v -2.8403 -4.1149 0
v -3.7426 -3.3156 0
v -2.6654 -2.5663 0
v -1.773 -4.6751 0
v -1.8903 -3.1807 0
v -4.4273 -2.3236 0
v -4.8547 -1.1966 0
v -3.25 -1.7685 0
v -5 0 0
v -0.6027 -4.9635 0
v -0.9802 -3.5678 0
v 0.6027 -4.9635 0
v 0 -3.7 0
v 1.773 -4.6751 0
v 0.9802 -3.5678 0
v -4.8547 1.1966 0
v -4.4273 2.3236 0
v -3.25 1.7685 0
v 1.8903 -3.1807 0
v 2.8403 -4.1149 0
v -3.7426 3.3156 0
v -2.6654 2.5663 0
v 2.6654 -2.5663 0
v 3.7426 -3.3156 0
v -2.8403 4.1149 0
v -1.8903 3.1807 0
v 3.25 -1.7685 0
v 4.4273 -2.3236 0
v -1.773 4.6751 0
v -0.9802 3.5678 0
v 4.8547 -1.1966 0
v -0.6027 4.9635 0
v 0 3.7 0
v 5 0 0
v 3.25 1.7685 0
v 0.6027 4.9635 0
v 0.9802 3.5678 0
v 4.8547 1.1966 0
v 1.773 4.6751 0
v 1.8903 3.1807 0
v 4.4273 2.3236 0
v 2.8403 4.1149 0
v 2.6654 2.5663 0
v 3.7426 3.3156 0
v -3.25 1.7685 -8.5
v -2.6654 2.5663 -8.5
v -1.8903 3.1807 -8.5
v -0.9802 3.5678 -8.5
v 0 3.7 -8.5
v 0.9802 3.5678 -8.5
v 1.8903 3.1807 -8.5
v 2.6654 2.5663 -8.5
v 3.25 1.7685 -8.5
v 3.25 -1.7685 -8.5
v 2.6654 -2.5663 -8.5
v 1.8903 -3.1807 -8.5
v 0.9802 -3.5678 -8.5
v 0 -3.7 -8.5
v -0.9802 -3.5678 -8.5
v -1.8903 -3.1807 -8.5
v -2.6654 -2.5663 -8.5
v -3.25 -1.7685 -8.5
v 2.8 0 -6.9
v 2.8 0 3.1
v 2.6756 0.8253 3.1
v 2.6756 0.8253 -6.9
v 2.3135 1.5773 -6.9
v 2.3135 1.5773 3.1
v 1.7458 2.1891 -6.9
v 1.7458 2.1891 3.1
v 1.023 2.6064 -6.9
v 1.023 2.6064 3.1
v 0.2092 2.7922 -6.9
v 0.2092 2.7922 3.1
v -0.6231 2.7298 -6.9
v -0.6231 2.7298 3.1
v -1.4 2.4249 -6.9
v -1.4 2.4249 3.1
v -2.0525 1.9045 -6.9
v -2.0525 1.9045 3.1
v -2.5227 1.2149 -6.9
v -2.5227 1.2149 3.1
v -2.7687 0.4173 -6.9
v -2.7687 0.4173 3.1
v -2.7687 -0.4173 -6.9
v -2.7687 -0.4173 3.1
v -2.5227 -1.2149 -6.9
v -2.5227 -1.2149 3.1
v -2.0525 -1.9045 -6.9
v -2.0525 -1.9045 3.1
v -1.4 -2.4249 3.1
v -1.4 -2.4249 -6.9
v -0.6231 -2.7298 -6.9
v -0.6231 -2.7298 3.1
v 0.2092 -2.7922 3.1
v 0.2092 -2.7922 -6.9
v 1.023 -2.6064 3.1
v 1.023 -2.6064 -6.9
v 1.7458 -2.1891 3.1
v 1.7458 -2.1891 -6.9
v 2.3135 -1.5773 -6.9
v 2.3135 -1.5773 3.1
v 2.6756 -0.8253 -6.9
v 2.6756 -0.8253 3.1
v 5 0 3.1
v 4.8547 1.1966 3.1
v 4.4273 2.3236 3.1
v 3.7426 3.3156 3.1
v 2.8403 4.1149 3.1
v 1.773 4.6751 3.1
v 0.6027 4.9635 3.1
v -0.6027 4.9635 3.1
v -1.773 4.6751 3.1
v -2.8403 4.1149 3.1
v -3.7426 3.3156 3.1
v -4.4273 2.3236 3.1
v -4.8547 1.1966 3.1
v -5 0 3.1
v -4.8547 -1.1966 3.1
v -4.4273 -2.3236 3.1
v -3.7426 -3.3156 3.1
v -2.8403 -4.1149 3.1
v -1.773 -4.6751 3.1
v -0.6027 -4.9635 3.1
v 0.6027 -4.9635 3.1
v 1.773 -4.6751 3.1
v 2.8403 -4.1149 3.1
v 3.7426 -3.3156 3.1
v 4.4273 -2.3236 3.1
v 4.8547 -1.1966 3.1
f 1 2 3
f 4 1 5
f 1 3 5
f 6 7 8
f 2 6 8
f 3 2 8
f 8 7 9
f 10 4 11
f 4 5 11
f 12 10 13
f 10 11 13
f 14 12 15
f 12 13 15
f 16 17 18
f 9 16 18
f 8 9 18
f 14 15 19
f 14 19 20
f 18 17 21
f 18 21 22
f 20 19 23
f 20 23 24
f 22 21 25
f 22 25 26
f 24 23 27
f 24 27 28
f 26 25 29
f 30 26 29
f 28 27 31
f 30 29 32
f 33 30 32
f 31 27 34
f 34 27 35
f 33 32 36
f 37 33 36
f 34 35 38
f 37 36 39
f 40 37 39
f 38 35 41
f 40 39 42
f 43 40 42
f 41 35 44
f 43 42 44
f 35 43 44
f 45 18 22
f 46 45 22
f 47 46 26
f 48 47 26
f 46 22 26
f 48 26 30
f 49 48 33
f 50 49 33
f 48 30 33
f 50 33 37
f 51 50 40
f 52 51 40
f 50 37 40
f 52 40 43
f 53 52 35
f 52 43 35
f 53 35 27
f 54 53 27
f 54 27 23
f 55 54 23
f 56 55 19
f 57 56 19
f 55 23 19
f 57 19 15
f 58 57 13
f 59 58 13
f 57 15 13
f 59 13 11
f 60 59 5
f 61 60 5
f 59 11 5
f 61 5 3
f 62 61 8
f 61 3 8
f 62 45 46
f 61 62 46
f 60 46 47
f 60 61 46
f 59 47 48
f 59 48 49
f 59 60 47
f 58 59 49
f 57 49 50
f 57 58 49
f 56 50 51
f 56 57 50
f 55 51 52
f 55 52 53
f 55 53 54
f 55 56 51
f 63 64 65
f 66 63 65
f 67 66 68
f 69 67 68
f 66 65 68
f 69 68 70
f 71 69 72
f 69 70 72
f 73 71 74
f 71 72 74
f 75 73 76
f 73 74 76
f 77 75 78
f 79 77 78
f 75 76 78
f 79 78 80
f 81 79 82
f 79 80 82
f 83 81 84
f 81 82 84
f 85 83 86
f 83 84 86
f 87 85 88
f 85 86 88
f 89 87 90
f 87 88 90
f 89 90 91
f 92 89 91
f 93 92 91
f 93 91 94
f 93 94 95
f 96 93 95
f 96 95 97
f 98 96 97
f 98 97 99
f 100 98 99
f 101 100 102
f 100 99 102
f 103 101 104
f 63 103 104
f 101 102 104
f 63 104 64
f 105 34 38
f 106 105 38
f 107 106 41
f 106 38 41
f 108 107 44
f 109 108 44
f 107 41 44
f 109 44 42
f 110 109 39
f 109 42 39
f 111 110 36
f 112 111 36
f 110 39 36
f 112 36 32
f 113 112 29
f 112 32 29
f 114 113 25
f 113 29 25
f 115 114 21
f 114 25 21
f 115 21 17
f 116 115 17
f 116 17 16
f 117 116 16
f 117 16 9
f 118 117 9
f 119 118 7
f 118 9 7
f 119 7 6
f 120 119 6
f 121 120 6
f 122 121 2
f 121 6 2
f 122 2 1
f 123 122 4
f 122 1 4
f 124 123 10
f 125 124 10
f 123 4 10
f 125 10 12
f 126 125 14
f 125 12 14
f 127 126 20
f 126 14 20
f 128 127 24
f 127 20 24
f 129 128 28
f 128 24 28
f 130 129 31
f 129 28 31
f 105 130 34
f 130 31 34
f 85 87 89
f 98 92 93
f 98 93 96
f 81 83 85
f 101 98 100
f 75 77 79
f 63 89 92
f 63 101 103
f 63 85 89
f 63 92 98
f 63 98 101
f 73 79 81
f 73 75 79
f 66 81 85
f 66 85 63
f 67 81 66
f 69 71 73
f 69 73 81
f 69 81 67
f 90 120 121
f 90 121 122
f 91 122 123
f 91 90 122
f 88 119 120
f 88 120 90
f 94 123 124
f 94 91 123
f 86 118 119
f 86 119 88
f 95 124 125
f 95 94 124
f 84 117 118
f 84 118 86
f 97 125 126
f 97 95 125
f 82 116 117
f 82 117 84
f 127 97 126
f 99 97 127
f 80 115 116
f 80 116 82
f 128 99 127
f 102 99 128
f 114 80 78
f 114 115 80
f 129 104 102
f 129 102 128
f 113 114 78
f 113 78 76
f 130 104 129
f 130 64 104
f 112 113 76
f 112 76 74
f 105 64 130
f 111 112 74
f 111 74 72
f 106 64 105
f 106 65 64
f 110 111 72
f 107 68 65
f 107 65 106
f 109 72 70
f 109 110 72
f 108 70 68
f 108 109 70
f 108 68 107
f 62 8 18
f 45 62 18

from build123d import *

# Parameters (mm, degrees)
PAD005_DEPTH    = 8.5
SKETCH013_R     = 5
PAD006_DEPTH    = 3.1
SKETCH015_R     = 2.8
POCKET005_DEPTH = 10


with BuildPart() as part:
    # Sketch012 (on Face1 of CopyCylinder) → Pad005 (new body)
    with BuildSketch(Plane(origin=(0, 0, 0), x_dir=(1, 0, 0), z_dir=(0, 0, -1))):
        with BuildLine():
            ThreePointArc((-3.25, -1.768474), (0, -3.7), (3.25, -1.768474))
            Line((3.25, -1.768474), (3.25, 1.768474))
            ThreePointArc((3.25, 1.768474), (0, 3.7), (-3.25, 1.768474))
            Line((-3.25, 1.768474), (-3.25, -1.768474))
        make_face()
    extrude(amount=PAD005_DEPTH)

    # Sketch013 (on Face5 of Pad005) → Pad006 (join)
    with BuildSketch(Plane.XY):
        Circle(SKETCH013_R)
    extrude(amount=PAD006_DEPTH)

    # Sketch015 (on Face3 of Pad006) → Pocket005 (cut)
    with BuildSketch(Plane.XY.offset(3.1)):
        Circle(SKETCH015_R)
    extrude(amount=-POCKET005_DEPTH, mode=Mode.SUBTRACT)


solid = part.part
